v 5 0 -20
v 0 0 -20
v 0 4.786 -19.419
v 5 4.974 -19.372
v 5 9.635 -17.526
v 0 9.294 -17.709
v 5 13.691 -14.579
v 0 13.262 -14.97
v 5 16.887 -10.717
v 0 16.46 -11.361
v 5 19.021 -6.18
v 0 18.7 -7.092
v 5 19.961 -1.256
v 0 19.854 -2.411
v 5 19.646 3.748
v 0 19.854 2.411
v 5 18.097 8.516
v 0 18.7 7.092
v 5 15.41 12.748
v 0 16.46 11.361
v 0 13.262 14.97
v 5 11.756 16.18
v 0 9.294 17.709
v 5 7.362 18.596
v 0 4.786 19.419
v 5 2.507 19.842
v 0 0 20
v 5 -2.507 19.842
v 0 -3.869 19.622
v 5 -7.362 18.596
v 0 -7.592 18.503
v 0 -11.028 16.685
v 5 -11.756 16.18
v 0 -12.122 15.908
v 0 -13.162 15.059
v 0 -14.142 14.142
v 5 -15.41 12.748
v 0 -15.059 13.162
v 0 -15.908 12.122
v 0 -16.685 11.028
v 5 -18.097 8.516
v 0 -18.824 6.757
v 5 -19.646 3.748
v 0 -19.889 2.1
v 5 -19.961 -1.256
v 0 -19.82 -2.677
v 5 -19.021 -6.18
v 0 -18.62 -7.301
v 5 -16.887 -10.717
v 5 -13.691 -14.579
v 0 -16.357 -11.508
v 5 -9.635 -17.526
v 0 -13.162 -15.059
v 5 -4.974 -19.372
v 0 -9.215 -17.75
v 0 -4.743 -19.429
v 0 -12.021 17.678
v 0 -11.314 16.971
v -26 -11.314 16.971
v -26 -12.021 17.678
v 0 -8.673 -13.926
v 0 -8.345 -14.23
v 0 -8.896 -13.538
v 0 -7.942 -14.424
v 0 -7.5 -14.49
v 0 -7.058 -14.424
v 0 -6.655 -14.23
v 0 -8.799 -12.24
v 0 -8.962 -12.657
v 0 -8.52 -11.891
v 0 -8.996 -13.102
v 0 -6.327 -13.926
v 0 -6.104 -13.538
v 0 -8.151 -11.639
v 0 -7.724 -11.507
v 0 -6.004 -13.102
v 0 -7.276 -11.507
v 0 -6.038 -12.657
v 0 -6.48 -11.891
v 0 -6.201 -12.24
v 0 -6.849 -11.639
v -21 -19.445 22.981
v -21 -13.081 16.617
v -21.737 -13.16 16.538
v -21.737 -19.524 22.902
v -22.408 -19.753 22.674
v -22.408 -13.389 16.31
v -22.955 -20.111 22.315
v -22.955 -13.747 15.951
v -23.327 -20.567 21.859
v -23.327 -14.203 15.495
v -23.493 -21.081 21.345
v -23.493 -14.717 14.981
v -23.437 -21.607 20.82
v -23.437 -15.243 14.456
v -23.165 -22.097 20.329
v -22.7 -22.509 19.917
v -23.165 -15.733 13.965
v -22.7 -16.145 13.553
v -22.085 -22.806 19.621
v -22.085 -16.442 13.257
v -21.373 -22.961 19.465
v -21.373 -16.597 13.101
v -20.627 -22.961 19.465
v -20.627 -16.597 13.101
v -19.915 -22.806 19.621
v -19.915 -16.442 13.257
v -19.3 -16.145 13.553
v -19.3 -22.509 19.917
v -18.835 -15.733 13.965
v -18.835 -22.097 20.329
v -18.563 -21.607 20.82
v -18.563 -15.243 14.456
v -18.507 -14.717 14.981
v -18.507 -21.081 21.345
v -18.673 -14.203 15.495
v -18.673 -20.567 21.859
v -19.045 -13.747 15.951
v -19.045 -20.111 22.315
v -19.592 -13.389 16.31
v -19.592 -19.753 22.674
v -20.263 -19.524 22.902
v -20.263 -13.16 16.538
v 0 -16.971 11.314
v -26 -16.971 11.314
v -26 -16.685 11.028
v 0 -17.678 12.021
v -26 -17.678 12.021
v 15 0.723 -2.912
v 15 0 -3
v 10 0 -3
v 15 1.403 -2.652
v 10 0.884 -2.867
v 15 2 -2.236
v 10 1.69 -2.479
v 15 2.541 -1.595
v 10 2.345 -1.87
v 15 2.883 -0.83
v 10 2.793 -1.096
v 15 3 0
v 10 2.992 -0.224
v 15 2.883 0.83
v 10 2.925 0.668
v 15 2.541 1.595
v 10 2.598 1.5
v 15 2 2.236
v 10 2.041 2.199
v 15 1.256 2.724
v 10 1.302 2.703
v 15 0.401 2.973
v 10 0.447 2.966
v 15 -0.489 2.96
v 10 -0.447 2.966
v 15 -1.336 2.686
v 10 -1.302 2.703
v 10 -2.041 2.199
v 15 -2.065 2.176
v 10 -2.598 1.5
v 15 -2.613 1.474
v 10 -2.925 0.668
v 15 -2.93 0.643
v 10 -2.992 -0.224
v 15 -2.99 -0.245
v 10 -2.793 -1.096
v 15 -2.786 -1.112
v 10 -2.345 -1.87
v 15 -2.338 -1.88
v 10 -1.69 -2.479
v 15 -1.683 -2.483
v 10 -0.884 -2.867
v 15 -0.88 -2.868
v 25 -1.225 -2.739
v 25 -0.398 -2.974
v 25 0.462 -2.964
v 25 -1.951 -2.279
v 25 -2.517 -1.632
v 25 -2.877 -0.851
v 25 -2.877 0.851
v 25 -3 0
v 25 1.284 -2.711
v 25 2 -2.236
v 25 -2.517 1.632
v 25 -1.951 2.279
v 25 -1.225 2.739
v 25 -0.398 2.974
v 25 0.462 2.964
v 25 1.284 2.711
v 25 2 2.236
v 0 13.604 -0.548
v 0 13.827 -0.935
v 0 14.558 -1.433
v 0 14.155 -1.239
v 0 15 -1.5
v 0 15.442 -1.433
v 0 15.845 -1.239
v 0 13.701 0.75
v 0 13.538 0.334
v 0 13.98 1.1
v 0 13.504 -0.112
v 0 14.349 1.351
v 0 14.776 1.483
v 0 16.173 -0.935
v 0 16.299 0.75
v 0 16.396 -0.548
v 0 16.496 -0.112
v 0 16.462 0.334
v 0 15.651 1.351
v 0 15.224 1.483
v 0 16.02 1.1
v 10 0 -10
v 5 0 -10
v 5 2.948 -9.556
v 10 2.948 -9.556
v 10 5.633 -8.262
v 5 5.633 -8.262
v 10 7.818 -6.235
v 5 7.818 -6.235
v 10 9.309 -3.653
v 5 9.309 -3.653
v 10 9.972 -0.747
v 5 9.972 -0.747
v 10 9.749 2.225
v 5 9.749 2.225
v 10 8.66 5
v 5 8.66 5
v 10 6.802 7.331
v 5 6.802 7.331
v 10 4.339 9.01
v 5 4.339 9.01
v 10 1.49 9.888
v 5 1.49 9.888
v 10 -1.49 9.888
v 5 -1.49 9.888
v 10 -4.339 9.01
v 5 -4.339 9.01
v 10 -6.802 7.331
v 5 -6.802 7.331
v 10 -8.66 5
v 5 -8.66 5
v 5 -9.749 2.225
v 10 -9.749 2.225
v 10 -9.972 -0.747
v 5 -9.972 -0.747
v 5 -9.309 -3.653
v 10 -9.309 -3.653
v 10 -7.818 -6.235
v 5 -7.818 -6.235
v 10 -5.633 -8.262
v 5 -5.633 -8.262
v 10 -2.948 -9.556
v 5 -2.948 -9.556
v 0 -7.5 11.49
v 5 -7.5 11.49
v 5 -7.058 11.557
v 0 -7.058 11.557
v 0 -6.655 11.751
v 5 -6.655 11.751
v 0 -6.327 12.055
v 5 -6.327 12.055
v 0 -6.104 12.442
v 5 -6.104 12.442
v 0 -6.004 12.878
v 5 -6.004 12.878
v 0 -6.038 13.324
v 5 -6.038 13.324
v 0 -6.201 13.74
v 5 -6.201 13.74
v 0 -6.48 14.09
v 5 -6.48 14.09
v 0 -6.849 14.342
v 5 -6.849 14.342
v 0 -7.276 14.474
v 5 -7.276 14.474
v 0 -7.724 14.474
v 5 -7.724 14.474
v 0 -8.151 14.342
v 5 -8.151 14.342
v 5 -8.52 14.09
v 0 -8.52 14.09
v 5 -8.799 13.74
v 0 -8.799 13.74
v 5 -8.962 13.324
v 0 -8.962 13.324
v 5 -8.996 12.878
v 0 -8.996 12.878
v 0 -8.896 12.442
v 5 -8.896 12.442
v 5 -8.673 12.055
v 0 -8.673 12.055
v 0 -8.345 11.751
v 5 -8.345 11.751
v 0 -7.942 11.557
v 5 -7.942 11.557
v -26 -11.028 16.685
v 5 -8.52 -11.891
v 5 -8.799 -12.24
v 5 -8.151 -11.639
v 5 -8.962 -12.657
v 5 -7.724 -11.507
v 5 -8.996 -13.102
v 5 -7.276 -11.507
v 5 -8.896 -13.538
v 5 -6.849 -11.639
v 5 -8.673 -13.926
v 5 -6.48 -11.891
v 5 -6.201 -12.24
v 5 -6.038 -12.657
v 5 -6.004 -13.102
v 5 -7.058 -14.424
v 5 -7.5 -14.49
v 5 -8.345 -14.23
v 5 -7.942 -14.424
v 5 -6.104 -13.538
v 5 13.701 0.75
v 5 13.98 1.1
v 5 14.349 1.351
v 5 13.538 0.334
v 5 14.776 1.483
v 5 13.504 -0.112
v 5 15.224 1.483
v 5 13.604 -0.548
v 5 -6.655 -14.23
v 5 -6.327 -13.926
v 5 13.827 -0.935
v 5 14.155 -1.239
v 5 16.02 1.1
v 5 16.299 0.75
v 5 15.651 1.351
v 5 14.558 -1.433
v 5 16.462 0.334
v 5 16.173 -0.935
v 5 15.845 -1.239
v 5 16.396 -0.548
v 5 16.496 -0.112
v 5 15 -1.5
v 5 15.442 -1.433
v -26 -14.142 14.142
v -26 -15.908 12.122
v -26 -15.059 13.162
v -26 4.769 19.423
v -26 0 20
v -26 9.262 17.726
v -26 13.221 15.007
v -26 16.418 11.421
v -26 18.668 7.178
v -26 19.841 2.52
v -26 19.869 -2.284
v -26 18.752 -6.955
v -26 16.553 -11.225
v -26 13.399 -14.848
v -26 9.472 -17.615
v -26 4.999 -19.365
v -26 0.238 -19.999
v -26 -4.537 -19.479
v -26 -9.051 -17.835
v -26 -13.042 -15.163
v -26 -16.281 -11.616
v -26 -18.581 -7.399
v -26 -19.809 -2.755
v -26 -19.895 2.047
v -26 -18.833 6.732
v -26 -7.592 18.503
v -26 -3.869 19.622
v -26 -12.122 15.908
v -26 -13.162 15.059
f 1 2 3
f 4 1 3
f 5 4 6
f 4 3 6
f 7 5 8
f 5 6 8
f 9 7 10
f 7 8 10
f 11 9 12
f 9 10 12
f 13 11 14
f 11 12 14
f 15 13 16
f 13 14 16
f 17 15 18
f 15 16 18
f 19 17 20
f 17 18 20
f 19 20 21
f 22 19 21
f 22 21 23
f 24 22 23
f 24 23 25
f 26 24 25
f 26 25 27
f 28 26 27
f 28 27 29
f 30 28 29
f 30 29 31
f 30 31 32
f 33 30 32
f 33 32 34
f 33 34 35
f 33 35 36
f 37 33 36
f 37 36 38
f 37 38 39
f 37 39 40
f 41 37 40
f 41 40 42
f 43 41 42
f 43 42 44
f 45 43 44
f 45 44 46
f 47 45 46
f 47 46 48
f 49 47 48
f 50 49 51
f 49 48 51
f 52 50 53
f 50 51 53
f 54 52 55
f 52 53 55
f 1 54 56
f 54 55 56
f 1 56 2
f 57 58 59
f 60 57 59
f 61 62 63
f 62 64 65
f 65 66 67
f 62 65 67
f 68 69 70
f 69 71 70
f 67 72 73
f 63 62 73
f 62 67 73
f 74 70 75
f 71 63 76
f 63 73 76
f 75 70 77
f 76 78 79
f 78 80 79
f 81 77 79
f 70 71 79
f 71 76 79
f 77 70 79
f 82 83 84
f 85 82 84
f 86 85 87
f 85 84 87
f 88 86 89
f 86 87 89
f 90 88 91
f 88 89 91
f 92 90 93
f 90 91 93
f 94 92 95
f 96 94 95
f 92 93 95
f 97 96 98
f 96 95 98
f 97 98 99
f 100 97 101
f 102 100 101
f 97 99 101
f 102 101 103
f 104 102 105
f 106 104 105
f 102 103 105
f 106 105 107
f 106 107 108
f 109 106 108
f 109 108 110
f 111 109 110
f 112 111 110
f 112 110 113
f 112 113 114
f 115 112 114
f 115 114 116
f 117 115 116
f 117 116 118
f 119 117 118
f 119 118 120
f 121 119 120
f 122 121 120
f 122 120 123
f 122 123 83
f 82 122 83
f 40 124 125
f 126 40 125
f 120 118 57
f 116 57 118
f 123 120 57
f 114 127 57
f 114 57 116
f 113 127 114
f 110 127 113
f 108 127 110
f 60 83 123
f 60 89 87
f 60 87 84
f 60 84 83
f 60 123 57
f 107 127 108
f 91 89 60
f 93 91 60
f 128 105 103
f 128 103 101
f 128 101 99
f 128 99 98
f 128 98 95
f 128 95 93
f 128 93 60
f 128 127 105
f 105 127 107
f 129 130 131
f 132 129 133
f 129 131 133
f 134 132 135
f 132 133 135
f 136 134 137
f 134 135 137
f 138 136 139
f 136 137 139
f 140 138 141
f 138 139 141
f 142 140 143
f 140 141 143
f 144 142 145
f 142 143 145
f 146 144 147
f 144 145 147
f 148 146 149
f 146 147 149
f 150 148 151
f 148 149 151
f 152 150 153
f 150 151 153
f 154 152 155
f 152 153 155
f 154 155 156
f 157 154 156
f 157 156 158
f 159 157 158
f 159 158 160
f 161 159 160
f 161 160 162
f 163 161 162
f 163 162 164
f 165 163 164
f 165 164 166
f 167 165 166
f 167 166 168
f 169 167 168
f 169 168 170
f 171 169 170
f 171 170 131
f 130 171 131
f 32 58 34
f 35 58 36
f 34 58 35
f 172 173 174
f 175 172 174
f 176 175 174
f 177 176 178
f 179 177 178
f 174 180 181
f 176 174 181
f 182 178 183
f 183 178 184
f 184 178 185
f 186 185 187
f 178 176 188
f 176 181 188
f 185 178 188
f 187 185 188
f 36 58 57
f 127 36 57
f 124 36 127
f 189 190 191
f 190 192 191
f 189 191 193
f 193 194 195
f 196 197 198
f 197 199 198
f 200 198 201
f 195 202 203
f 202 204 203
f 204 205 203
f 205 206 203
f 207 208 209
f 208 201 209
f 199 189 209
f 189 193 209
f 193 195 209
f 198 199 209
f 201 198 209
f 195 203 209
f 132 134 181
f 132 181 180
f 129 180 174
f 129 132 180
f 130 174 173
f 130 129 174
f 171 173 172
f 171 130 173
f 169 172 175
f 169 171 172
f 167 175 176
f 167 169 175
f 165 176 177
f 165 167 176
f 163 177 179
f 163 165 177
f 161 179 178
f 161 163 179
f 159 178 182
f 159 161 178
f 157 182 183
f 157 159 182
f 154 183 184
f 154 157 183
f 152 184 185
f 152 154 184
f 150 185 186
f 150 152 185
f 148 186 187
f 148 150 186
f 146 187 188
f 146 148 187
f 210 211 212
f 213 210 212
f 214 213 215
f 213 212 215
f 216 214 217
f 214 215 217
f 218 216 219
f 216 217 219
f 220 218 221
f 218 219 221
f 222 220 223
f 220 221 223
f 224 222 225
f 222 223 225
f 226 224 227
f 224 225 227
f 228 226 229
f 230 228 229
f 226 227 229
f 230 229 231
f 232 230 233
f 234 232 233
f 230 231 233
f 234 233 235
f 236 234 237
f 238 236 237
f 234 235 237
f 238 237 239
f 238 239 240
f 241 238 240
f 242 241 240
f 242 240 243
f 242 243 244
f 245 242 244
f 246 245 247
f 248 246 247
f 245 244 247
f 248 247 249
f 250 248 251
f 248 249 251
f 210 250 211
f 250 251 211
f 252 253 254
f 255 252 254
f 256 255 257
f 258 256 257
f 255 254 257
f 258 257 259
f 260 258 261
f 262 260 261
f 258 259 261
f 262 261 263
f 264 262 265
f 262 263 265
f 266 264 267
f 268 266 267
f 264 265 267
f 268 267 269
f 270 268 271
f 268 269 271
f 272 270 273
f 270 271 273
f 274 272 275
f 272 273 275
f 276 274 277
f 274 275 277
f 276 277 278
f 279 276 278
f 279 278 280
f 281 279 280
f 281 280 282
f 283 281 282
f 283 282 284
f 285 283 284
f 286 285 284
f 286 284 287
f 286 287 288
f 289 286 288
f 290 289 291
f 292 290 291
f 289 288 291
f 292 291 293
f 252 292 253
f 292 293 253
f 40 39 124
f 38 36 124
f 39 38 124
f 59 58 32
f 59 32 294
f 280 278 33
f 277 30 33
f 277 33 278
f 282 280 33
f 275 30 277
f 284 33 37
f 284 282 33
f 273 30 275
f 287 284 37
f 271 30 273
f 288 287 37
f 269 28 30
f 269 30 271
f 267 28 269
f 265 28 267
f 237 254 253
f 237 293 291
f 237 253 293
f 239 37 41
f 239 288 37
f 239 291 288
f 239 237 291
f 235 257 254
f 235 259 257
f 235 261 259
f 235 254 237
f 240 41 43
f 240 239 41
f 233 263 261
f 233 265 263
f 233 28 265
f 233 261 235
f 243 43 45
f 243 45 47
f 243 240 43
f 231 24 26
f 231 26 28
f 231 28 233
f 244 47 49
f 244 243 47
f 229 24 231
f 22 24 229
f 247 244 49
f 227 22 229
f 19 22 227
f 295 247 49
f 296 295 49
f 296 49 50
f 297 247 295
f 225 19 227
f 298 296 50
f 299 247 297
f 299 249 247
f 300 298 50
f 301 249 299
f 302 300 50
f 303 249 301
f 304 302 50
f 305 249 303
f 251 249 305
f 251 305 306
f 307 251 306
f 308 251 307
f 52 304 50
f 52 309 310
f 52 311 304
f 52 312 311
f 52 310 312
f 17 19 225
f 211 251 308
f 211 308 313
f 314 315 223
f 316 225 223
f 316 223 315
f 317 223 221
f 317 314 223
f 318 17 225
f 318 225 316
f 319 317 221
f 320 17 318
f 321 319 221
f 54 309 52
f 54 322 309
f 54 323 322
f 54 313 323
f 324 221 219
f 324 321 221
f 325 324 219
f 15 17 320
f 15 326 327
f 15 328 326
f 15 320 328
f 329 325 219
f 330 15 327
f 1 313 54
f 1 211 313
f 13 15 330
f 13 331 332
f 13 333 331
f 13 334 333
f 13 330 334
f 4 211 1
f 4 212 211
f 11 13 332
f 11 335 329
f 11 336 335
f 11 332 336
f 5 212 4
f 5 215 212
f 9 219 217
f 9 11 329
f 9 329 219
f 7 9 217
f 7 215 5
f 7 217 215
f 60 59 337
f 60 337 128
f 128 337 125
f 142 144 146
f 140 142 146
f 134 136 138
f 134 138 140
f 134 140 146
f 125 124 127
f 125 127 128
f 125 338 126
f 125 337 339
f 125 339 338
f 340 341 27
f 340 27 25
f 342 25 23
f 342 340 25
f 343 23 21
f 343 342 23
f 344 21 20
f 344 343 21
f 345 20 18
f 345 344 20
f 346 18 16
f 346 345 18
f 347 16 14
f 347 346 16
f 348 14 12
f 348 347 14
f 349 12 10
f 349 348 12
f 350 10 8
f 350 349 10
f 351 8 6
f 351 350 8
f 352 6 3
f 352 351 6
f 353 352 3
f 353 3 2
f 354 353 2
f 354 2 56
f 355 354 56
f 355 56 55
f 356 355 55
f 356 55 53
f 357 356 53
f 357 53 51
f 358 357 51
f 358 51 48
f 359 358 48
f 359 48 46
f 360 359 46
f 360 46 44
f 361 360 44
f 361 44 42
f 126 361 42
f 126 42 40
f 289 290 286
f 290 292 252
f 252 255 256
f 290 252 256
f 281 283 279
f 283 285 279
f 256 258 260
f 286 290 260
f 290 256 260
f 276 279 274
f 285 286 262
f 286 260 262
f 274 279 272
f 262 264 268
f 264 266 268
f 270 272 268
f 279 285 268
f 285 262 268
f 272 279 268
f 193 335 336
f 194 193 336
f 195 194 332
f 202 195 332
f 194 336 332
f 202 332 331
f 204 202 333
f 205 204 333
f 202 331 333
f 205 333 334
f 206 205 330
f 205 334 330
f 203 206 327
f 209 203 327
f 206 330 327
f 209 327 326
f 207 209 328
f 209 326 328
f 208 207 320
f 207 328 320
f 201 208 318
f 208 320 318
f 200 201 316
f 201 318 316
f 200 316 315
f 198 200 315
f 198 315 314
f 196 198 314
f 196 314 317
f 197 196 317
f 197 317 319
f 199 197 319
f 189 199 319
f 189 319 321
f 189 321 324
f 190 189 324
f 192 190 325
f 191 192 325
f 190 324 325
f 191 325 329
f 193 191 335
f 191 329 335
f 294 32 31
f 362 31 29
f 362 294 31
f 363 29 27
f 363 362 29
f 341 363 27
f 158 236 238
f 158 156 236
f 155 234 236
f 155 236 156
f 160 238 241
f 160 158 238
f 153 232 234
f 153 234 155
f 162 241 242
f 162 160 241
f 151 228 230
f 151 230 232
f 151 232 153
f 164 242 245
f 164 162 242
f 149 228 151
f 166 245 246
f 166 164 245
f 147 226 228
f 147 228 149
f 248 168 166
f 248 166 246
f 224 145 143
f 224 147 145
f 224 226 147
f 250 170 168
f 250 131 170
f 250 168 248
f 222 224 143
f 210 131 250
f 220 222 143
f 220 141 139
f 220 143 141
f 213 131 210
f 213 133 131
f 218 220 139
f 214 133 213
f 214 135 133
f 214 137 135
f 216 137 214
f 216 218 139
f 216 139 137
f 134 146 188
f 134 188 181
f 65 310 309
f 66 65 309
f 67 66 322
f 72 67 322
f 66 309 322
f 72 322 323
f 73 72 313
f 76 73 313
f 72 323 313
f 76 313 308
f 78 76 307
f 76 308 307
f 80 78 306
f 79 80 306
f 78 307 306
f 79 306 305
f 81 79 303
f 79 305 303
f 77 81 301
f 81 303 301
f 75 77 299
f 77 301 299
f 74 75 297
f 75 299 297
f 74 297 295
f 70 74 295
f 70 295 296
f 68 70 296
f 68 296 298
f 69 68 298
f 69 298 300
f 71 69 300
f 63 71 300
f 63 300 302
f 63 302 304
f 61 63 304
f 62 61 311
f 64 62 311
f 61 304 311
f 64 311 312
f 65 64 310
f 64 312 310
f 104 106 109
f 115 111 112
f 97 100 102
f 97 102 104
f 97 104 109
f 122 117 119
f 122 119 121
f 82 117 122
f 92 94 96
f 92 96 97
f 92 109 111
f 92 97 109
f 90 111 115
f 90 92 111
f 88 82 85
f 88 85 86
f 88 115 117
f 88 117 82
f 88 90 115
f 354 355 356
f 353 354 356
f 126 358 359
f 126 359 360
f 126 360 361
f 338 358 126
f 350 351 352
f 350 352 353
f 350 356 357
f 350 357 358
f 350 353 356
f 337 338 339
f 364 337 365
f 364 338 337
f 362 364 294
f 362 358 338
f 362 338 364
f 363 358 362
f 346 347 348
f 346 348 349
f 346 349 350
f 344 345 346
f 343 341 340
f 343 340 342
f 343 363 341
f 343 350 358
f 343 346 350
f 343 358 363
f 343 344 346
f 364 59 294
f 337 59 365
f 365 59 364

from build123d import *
from build123d.topology import SkipClean

# Parameters (mm, degrees)
SKETCH_1_R                       = 20
EXTRUDE_1_DEPTH                  = 5
SKETCH_2_R                       = 10
EXTRUDE_2_DEPTH                  = 5
SKETCH_3_R                       = 1.5
CUT_EXTRUDE_1_DEPTH              = 5
SKETCH_4_R                       = 3
EXTRUDE_3_DEPTH                  = 5
EXTRUDE_4_DEPTH                  = 10
EXTRUDE_START                    = 26
SKETCH_6_R                       = 20
EXTRUDE_5_DEPTH                  = 26
SKETCH_8_R                       = 2.5
EXTRUDE_6_DEPTH                  = 10
EXTRUDE_6_DIRECTION_2_REACH      = 56.84
EXTRUDE_6_DIRECTION_2_END_RADIUS = 20
SKETCH_9_W                       = 26
SKETCH_9_H                       = 8
EXTRUDE_7_DEPTH                  = 1
EXTRUDE_7_DIRECTION_2_REACH      = 56.84
EXTRUDE_7_DIRECTION_2_END_RADIUS = 20


with BuildPart() as part:
    # Эскиз1 → Бобышка-Вытянуть1 (new body)
    with BuildSketch(Plane(origin=(0, 0, 0), x_dir=(0, 0, -1), z_dir=(1, 0, 0))):
        Circle(SKETCH_1_R)
    extrude(amount=EXTRUDE_1_DEPTH)

    # Эскиз2 → Бобышка-Вытянуть2 (add)
    with BuildSketch(Plane(origin=(5, 0, 0), x_dir=(0, 0, -1), z_dir=(1, 0, 0))):
        Circle(SKETCH_2_R)
    extrude(amount=EXTRUDE_2_DEPTH)

    # Эскиз3 → Вырез-Вытянуть1 (cut)
    with BuildSketch(Plane(origin=(5, 0, 0), x_dir=(0, 0, -1), z_dir=(1, 0, 0))):
        with Locations((0, 15)):
            Circle(SKETCH_3_R)
        with Locations((12.990381057, -7.5)):
            Circle(SKETCH_3_R)
        with Locations((-12.990381057, -7.5)):
            Circle(SKETCH_3_R)
    extrude(amount=-CUT_EXTRUDE_1_DEPTH, mode=Mode.SUBTRACT)

    # Эскиз4 → Бобышка-Вытянуть3 (add)
    with BuildSketch(Plane(origin=(10, 0, 0), x_dir=(0, 0, -1), z_dir=(1, 0, 0))):
        Circle(SKETCH_4_R)
    extrude(amount=EXTRUDE_3_DEPTH)

    # Эскиз5 → Бобышка-Вытянуть4 (add)
    with BuildSketch(Plane(origin=(15, 0, 0), x_dir=(0, 0, -1), z_dir=(1, 0, 0))):
        with BuildLine():
            Line((-2.236067977, 2), (2.236067977, 2))
            ThreePointArc((2.236067977, 2), (0, -3), (-2.236067977, 2))
        make_face()
    extrude(amount=EXTRUDE_4_DEPTH)

    # Эскиз6 → Бобышка-Вытянуть5 (add)
    with BuildSketch(Plane.ZY.offset(EXTRUDE_START)):
        Circle(SKETCH_6_R)
    extrude(amount=-EXTRUDE_5_DEPTH)

    # Эскиз8 → Бобышка-Вытянуть6 (add)
    with BuildSketch(Plane(origin=(0, -14.142135624, 14.142135624), x_dir=(-1, 0, 0), z_dir=(0, -0.7071067811865511, 0.707106781186544))):
        with Locations(Location((21, 0, 0), (0, 0, 270))):
            Circle(SKETCH_8_R)
    extrude(amount=EXTRUDE_6_DEPTH)

    # Бобышка-Вытянуть6 direction 2: up to this cylinder (the profile starts outside it)
    with SkipClean():  # the faces are left unmerged after this step: merging them gives an invalid solid
        extrude_6_direction_2_end = Plane(origin=(-21, 0, 0), z_dir=(-1, 0, 0)) * Cylinder(EXTRUDE_6_DIRECTION_2_END_RADIUS, 154.68, mode=Mode.PRIVATE)
        # Эскиз8 → Бобышка-Вытянуть6 direction 2 (add, up to the surface)
        with BuildSketch(Plane(origin=(0, -14.142135624, 14.142135624), x_dir=(-1, 0, 0), z_dir=(0, -0.7071067811865511, 0.707106781186544)), mode=Mode.PRIVATE) as extrude_6_direction_2_sk1:
            with Locations(Location((21, 0, 0), (0, 0, 270))):
                Circle(SKETCH_8_R)
        extrude_6_direction_2_tool1 = extrude(extrude_6_direction_2_sk1.sketch, amount=-EXTRUDE_6_DIRECTION_2_REACH, mode=Mode.PRIVATE) - extrude_6_direction_2_end
        add(extrude_6_direction_2_tool1.solids().sort_by_distance((-21, -14.142136, 14.142136))[0])
        add(extrude_6_direction_2_tool1.solids().sort_by_distance((-21, -14.142136, 14.142136))[1])

    # Эскиз9 → Бобышка-Вытянуть7 (add)
    with SkipClean():  # the faces are left unmerged after this step: merging them gives an invalid solid
        with BuildSketch(Plane(origin=(0, -14.142135624, 14.142135624), x_dir=(-1, 0, 0), z_dir=(0, -0.7071067811865511, 0.707106781186544))):
            with Locations((13, 0)):
                Rectangle(SKETCH_9_W, SKETCH_9_H)
        extrude(amount=EXTRUDE_7_DEPTH)

    # Бобышка-Вытянуть7 direction 2: up to this cylinder (the profile starts outside it)
    with SkipClean():  # the faces are left unmerged after this step: merging them gives an invalid solid
        extrude_7_direction_2_end = Plane(origin=(-13, 0, 0), z_dir=(-1, 0, 0)) * Cylinder(EXTRUDE_7_DIRECTION_2_END_RADIUS, 154.68, mode=Mode.PRIVATE)
        # Эскиз9 → Бобышка-Вытянуть7 direction 2 (add, up to the surface)
        with BuildSketch(Plane(origin=(0, -14.142135624, 14.142135624), x_dir=(-1, 0, 0), z_dir=(0, -0.7071067811865511, 0.707106781186544)), mode=Mode.PRIVATE) as extrude_7_direction_2_sk1:
            with Locations((13, 0)):
                Rectangle(SKETCH_9_W, SKETCH_9_H)
        extrude_7_direction_2_tool1 = extrude(extrude_7_direction_2_sk1.sketch, amount=-EXTRUDE_7_DIRECTION_2_REACH, mode=Mode.PRIVATE) - extrude_7_direction_2_end
        add(extrude_7_direction_2_tool1.solids().sort_by_distance((-13, -14.142136, 14.142136))[0])
        add(extrude_7_direction_2_tool1.solids().sort_by_distance((-13, -14.142136, 14.142136))[1])


solid = part.part
